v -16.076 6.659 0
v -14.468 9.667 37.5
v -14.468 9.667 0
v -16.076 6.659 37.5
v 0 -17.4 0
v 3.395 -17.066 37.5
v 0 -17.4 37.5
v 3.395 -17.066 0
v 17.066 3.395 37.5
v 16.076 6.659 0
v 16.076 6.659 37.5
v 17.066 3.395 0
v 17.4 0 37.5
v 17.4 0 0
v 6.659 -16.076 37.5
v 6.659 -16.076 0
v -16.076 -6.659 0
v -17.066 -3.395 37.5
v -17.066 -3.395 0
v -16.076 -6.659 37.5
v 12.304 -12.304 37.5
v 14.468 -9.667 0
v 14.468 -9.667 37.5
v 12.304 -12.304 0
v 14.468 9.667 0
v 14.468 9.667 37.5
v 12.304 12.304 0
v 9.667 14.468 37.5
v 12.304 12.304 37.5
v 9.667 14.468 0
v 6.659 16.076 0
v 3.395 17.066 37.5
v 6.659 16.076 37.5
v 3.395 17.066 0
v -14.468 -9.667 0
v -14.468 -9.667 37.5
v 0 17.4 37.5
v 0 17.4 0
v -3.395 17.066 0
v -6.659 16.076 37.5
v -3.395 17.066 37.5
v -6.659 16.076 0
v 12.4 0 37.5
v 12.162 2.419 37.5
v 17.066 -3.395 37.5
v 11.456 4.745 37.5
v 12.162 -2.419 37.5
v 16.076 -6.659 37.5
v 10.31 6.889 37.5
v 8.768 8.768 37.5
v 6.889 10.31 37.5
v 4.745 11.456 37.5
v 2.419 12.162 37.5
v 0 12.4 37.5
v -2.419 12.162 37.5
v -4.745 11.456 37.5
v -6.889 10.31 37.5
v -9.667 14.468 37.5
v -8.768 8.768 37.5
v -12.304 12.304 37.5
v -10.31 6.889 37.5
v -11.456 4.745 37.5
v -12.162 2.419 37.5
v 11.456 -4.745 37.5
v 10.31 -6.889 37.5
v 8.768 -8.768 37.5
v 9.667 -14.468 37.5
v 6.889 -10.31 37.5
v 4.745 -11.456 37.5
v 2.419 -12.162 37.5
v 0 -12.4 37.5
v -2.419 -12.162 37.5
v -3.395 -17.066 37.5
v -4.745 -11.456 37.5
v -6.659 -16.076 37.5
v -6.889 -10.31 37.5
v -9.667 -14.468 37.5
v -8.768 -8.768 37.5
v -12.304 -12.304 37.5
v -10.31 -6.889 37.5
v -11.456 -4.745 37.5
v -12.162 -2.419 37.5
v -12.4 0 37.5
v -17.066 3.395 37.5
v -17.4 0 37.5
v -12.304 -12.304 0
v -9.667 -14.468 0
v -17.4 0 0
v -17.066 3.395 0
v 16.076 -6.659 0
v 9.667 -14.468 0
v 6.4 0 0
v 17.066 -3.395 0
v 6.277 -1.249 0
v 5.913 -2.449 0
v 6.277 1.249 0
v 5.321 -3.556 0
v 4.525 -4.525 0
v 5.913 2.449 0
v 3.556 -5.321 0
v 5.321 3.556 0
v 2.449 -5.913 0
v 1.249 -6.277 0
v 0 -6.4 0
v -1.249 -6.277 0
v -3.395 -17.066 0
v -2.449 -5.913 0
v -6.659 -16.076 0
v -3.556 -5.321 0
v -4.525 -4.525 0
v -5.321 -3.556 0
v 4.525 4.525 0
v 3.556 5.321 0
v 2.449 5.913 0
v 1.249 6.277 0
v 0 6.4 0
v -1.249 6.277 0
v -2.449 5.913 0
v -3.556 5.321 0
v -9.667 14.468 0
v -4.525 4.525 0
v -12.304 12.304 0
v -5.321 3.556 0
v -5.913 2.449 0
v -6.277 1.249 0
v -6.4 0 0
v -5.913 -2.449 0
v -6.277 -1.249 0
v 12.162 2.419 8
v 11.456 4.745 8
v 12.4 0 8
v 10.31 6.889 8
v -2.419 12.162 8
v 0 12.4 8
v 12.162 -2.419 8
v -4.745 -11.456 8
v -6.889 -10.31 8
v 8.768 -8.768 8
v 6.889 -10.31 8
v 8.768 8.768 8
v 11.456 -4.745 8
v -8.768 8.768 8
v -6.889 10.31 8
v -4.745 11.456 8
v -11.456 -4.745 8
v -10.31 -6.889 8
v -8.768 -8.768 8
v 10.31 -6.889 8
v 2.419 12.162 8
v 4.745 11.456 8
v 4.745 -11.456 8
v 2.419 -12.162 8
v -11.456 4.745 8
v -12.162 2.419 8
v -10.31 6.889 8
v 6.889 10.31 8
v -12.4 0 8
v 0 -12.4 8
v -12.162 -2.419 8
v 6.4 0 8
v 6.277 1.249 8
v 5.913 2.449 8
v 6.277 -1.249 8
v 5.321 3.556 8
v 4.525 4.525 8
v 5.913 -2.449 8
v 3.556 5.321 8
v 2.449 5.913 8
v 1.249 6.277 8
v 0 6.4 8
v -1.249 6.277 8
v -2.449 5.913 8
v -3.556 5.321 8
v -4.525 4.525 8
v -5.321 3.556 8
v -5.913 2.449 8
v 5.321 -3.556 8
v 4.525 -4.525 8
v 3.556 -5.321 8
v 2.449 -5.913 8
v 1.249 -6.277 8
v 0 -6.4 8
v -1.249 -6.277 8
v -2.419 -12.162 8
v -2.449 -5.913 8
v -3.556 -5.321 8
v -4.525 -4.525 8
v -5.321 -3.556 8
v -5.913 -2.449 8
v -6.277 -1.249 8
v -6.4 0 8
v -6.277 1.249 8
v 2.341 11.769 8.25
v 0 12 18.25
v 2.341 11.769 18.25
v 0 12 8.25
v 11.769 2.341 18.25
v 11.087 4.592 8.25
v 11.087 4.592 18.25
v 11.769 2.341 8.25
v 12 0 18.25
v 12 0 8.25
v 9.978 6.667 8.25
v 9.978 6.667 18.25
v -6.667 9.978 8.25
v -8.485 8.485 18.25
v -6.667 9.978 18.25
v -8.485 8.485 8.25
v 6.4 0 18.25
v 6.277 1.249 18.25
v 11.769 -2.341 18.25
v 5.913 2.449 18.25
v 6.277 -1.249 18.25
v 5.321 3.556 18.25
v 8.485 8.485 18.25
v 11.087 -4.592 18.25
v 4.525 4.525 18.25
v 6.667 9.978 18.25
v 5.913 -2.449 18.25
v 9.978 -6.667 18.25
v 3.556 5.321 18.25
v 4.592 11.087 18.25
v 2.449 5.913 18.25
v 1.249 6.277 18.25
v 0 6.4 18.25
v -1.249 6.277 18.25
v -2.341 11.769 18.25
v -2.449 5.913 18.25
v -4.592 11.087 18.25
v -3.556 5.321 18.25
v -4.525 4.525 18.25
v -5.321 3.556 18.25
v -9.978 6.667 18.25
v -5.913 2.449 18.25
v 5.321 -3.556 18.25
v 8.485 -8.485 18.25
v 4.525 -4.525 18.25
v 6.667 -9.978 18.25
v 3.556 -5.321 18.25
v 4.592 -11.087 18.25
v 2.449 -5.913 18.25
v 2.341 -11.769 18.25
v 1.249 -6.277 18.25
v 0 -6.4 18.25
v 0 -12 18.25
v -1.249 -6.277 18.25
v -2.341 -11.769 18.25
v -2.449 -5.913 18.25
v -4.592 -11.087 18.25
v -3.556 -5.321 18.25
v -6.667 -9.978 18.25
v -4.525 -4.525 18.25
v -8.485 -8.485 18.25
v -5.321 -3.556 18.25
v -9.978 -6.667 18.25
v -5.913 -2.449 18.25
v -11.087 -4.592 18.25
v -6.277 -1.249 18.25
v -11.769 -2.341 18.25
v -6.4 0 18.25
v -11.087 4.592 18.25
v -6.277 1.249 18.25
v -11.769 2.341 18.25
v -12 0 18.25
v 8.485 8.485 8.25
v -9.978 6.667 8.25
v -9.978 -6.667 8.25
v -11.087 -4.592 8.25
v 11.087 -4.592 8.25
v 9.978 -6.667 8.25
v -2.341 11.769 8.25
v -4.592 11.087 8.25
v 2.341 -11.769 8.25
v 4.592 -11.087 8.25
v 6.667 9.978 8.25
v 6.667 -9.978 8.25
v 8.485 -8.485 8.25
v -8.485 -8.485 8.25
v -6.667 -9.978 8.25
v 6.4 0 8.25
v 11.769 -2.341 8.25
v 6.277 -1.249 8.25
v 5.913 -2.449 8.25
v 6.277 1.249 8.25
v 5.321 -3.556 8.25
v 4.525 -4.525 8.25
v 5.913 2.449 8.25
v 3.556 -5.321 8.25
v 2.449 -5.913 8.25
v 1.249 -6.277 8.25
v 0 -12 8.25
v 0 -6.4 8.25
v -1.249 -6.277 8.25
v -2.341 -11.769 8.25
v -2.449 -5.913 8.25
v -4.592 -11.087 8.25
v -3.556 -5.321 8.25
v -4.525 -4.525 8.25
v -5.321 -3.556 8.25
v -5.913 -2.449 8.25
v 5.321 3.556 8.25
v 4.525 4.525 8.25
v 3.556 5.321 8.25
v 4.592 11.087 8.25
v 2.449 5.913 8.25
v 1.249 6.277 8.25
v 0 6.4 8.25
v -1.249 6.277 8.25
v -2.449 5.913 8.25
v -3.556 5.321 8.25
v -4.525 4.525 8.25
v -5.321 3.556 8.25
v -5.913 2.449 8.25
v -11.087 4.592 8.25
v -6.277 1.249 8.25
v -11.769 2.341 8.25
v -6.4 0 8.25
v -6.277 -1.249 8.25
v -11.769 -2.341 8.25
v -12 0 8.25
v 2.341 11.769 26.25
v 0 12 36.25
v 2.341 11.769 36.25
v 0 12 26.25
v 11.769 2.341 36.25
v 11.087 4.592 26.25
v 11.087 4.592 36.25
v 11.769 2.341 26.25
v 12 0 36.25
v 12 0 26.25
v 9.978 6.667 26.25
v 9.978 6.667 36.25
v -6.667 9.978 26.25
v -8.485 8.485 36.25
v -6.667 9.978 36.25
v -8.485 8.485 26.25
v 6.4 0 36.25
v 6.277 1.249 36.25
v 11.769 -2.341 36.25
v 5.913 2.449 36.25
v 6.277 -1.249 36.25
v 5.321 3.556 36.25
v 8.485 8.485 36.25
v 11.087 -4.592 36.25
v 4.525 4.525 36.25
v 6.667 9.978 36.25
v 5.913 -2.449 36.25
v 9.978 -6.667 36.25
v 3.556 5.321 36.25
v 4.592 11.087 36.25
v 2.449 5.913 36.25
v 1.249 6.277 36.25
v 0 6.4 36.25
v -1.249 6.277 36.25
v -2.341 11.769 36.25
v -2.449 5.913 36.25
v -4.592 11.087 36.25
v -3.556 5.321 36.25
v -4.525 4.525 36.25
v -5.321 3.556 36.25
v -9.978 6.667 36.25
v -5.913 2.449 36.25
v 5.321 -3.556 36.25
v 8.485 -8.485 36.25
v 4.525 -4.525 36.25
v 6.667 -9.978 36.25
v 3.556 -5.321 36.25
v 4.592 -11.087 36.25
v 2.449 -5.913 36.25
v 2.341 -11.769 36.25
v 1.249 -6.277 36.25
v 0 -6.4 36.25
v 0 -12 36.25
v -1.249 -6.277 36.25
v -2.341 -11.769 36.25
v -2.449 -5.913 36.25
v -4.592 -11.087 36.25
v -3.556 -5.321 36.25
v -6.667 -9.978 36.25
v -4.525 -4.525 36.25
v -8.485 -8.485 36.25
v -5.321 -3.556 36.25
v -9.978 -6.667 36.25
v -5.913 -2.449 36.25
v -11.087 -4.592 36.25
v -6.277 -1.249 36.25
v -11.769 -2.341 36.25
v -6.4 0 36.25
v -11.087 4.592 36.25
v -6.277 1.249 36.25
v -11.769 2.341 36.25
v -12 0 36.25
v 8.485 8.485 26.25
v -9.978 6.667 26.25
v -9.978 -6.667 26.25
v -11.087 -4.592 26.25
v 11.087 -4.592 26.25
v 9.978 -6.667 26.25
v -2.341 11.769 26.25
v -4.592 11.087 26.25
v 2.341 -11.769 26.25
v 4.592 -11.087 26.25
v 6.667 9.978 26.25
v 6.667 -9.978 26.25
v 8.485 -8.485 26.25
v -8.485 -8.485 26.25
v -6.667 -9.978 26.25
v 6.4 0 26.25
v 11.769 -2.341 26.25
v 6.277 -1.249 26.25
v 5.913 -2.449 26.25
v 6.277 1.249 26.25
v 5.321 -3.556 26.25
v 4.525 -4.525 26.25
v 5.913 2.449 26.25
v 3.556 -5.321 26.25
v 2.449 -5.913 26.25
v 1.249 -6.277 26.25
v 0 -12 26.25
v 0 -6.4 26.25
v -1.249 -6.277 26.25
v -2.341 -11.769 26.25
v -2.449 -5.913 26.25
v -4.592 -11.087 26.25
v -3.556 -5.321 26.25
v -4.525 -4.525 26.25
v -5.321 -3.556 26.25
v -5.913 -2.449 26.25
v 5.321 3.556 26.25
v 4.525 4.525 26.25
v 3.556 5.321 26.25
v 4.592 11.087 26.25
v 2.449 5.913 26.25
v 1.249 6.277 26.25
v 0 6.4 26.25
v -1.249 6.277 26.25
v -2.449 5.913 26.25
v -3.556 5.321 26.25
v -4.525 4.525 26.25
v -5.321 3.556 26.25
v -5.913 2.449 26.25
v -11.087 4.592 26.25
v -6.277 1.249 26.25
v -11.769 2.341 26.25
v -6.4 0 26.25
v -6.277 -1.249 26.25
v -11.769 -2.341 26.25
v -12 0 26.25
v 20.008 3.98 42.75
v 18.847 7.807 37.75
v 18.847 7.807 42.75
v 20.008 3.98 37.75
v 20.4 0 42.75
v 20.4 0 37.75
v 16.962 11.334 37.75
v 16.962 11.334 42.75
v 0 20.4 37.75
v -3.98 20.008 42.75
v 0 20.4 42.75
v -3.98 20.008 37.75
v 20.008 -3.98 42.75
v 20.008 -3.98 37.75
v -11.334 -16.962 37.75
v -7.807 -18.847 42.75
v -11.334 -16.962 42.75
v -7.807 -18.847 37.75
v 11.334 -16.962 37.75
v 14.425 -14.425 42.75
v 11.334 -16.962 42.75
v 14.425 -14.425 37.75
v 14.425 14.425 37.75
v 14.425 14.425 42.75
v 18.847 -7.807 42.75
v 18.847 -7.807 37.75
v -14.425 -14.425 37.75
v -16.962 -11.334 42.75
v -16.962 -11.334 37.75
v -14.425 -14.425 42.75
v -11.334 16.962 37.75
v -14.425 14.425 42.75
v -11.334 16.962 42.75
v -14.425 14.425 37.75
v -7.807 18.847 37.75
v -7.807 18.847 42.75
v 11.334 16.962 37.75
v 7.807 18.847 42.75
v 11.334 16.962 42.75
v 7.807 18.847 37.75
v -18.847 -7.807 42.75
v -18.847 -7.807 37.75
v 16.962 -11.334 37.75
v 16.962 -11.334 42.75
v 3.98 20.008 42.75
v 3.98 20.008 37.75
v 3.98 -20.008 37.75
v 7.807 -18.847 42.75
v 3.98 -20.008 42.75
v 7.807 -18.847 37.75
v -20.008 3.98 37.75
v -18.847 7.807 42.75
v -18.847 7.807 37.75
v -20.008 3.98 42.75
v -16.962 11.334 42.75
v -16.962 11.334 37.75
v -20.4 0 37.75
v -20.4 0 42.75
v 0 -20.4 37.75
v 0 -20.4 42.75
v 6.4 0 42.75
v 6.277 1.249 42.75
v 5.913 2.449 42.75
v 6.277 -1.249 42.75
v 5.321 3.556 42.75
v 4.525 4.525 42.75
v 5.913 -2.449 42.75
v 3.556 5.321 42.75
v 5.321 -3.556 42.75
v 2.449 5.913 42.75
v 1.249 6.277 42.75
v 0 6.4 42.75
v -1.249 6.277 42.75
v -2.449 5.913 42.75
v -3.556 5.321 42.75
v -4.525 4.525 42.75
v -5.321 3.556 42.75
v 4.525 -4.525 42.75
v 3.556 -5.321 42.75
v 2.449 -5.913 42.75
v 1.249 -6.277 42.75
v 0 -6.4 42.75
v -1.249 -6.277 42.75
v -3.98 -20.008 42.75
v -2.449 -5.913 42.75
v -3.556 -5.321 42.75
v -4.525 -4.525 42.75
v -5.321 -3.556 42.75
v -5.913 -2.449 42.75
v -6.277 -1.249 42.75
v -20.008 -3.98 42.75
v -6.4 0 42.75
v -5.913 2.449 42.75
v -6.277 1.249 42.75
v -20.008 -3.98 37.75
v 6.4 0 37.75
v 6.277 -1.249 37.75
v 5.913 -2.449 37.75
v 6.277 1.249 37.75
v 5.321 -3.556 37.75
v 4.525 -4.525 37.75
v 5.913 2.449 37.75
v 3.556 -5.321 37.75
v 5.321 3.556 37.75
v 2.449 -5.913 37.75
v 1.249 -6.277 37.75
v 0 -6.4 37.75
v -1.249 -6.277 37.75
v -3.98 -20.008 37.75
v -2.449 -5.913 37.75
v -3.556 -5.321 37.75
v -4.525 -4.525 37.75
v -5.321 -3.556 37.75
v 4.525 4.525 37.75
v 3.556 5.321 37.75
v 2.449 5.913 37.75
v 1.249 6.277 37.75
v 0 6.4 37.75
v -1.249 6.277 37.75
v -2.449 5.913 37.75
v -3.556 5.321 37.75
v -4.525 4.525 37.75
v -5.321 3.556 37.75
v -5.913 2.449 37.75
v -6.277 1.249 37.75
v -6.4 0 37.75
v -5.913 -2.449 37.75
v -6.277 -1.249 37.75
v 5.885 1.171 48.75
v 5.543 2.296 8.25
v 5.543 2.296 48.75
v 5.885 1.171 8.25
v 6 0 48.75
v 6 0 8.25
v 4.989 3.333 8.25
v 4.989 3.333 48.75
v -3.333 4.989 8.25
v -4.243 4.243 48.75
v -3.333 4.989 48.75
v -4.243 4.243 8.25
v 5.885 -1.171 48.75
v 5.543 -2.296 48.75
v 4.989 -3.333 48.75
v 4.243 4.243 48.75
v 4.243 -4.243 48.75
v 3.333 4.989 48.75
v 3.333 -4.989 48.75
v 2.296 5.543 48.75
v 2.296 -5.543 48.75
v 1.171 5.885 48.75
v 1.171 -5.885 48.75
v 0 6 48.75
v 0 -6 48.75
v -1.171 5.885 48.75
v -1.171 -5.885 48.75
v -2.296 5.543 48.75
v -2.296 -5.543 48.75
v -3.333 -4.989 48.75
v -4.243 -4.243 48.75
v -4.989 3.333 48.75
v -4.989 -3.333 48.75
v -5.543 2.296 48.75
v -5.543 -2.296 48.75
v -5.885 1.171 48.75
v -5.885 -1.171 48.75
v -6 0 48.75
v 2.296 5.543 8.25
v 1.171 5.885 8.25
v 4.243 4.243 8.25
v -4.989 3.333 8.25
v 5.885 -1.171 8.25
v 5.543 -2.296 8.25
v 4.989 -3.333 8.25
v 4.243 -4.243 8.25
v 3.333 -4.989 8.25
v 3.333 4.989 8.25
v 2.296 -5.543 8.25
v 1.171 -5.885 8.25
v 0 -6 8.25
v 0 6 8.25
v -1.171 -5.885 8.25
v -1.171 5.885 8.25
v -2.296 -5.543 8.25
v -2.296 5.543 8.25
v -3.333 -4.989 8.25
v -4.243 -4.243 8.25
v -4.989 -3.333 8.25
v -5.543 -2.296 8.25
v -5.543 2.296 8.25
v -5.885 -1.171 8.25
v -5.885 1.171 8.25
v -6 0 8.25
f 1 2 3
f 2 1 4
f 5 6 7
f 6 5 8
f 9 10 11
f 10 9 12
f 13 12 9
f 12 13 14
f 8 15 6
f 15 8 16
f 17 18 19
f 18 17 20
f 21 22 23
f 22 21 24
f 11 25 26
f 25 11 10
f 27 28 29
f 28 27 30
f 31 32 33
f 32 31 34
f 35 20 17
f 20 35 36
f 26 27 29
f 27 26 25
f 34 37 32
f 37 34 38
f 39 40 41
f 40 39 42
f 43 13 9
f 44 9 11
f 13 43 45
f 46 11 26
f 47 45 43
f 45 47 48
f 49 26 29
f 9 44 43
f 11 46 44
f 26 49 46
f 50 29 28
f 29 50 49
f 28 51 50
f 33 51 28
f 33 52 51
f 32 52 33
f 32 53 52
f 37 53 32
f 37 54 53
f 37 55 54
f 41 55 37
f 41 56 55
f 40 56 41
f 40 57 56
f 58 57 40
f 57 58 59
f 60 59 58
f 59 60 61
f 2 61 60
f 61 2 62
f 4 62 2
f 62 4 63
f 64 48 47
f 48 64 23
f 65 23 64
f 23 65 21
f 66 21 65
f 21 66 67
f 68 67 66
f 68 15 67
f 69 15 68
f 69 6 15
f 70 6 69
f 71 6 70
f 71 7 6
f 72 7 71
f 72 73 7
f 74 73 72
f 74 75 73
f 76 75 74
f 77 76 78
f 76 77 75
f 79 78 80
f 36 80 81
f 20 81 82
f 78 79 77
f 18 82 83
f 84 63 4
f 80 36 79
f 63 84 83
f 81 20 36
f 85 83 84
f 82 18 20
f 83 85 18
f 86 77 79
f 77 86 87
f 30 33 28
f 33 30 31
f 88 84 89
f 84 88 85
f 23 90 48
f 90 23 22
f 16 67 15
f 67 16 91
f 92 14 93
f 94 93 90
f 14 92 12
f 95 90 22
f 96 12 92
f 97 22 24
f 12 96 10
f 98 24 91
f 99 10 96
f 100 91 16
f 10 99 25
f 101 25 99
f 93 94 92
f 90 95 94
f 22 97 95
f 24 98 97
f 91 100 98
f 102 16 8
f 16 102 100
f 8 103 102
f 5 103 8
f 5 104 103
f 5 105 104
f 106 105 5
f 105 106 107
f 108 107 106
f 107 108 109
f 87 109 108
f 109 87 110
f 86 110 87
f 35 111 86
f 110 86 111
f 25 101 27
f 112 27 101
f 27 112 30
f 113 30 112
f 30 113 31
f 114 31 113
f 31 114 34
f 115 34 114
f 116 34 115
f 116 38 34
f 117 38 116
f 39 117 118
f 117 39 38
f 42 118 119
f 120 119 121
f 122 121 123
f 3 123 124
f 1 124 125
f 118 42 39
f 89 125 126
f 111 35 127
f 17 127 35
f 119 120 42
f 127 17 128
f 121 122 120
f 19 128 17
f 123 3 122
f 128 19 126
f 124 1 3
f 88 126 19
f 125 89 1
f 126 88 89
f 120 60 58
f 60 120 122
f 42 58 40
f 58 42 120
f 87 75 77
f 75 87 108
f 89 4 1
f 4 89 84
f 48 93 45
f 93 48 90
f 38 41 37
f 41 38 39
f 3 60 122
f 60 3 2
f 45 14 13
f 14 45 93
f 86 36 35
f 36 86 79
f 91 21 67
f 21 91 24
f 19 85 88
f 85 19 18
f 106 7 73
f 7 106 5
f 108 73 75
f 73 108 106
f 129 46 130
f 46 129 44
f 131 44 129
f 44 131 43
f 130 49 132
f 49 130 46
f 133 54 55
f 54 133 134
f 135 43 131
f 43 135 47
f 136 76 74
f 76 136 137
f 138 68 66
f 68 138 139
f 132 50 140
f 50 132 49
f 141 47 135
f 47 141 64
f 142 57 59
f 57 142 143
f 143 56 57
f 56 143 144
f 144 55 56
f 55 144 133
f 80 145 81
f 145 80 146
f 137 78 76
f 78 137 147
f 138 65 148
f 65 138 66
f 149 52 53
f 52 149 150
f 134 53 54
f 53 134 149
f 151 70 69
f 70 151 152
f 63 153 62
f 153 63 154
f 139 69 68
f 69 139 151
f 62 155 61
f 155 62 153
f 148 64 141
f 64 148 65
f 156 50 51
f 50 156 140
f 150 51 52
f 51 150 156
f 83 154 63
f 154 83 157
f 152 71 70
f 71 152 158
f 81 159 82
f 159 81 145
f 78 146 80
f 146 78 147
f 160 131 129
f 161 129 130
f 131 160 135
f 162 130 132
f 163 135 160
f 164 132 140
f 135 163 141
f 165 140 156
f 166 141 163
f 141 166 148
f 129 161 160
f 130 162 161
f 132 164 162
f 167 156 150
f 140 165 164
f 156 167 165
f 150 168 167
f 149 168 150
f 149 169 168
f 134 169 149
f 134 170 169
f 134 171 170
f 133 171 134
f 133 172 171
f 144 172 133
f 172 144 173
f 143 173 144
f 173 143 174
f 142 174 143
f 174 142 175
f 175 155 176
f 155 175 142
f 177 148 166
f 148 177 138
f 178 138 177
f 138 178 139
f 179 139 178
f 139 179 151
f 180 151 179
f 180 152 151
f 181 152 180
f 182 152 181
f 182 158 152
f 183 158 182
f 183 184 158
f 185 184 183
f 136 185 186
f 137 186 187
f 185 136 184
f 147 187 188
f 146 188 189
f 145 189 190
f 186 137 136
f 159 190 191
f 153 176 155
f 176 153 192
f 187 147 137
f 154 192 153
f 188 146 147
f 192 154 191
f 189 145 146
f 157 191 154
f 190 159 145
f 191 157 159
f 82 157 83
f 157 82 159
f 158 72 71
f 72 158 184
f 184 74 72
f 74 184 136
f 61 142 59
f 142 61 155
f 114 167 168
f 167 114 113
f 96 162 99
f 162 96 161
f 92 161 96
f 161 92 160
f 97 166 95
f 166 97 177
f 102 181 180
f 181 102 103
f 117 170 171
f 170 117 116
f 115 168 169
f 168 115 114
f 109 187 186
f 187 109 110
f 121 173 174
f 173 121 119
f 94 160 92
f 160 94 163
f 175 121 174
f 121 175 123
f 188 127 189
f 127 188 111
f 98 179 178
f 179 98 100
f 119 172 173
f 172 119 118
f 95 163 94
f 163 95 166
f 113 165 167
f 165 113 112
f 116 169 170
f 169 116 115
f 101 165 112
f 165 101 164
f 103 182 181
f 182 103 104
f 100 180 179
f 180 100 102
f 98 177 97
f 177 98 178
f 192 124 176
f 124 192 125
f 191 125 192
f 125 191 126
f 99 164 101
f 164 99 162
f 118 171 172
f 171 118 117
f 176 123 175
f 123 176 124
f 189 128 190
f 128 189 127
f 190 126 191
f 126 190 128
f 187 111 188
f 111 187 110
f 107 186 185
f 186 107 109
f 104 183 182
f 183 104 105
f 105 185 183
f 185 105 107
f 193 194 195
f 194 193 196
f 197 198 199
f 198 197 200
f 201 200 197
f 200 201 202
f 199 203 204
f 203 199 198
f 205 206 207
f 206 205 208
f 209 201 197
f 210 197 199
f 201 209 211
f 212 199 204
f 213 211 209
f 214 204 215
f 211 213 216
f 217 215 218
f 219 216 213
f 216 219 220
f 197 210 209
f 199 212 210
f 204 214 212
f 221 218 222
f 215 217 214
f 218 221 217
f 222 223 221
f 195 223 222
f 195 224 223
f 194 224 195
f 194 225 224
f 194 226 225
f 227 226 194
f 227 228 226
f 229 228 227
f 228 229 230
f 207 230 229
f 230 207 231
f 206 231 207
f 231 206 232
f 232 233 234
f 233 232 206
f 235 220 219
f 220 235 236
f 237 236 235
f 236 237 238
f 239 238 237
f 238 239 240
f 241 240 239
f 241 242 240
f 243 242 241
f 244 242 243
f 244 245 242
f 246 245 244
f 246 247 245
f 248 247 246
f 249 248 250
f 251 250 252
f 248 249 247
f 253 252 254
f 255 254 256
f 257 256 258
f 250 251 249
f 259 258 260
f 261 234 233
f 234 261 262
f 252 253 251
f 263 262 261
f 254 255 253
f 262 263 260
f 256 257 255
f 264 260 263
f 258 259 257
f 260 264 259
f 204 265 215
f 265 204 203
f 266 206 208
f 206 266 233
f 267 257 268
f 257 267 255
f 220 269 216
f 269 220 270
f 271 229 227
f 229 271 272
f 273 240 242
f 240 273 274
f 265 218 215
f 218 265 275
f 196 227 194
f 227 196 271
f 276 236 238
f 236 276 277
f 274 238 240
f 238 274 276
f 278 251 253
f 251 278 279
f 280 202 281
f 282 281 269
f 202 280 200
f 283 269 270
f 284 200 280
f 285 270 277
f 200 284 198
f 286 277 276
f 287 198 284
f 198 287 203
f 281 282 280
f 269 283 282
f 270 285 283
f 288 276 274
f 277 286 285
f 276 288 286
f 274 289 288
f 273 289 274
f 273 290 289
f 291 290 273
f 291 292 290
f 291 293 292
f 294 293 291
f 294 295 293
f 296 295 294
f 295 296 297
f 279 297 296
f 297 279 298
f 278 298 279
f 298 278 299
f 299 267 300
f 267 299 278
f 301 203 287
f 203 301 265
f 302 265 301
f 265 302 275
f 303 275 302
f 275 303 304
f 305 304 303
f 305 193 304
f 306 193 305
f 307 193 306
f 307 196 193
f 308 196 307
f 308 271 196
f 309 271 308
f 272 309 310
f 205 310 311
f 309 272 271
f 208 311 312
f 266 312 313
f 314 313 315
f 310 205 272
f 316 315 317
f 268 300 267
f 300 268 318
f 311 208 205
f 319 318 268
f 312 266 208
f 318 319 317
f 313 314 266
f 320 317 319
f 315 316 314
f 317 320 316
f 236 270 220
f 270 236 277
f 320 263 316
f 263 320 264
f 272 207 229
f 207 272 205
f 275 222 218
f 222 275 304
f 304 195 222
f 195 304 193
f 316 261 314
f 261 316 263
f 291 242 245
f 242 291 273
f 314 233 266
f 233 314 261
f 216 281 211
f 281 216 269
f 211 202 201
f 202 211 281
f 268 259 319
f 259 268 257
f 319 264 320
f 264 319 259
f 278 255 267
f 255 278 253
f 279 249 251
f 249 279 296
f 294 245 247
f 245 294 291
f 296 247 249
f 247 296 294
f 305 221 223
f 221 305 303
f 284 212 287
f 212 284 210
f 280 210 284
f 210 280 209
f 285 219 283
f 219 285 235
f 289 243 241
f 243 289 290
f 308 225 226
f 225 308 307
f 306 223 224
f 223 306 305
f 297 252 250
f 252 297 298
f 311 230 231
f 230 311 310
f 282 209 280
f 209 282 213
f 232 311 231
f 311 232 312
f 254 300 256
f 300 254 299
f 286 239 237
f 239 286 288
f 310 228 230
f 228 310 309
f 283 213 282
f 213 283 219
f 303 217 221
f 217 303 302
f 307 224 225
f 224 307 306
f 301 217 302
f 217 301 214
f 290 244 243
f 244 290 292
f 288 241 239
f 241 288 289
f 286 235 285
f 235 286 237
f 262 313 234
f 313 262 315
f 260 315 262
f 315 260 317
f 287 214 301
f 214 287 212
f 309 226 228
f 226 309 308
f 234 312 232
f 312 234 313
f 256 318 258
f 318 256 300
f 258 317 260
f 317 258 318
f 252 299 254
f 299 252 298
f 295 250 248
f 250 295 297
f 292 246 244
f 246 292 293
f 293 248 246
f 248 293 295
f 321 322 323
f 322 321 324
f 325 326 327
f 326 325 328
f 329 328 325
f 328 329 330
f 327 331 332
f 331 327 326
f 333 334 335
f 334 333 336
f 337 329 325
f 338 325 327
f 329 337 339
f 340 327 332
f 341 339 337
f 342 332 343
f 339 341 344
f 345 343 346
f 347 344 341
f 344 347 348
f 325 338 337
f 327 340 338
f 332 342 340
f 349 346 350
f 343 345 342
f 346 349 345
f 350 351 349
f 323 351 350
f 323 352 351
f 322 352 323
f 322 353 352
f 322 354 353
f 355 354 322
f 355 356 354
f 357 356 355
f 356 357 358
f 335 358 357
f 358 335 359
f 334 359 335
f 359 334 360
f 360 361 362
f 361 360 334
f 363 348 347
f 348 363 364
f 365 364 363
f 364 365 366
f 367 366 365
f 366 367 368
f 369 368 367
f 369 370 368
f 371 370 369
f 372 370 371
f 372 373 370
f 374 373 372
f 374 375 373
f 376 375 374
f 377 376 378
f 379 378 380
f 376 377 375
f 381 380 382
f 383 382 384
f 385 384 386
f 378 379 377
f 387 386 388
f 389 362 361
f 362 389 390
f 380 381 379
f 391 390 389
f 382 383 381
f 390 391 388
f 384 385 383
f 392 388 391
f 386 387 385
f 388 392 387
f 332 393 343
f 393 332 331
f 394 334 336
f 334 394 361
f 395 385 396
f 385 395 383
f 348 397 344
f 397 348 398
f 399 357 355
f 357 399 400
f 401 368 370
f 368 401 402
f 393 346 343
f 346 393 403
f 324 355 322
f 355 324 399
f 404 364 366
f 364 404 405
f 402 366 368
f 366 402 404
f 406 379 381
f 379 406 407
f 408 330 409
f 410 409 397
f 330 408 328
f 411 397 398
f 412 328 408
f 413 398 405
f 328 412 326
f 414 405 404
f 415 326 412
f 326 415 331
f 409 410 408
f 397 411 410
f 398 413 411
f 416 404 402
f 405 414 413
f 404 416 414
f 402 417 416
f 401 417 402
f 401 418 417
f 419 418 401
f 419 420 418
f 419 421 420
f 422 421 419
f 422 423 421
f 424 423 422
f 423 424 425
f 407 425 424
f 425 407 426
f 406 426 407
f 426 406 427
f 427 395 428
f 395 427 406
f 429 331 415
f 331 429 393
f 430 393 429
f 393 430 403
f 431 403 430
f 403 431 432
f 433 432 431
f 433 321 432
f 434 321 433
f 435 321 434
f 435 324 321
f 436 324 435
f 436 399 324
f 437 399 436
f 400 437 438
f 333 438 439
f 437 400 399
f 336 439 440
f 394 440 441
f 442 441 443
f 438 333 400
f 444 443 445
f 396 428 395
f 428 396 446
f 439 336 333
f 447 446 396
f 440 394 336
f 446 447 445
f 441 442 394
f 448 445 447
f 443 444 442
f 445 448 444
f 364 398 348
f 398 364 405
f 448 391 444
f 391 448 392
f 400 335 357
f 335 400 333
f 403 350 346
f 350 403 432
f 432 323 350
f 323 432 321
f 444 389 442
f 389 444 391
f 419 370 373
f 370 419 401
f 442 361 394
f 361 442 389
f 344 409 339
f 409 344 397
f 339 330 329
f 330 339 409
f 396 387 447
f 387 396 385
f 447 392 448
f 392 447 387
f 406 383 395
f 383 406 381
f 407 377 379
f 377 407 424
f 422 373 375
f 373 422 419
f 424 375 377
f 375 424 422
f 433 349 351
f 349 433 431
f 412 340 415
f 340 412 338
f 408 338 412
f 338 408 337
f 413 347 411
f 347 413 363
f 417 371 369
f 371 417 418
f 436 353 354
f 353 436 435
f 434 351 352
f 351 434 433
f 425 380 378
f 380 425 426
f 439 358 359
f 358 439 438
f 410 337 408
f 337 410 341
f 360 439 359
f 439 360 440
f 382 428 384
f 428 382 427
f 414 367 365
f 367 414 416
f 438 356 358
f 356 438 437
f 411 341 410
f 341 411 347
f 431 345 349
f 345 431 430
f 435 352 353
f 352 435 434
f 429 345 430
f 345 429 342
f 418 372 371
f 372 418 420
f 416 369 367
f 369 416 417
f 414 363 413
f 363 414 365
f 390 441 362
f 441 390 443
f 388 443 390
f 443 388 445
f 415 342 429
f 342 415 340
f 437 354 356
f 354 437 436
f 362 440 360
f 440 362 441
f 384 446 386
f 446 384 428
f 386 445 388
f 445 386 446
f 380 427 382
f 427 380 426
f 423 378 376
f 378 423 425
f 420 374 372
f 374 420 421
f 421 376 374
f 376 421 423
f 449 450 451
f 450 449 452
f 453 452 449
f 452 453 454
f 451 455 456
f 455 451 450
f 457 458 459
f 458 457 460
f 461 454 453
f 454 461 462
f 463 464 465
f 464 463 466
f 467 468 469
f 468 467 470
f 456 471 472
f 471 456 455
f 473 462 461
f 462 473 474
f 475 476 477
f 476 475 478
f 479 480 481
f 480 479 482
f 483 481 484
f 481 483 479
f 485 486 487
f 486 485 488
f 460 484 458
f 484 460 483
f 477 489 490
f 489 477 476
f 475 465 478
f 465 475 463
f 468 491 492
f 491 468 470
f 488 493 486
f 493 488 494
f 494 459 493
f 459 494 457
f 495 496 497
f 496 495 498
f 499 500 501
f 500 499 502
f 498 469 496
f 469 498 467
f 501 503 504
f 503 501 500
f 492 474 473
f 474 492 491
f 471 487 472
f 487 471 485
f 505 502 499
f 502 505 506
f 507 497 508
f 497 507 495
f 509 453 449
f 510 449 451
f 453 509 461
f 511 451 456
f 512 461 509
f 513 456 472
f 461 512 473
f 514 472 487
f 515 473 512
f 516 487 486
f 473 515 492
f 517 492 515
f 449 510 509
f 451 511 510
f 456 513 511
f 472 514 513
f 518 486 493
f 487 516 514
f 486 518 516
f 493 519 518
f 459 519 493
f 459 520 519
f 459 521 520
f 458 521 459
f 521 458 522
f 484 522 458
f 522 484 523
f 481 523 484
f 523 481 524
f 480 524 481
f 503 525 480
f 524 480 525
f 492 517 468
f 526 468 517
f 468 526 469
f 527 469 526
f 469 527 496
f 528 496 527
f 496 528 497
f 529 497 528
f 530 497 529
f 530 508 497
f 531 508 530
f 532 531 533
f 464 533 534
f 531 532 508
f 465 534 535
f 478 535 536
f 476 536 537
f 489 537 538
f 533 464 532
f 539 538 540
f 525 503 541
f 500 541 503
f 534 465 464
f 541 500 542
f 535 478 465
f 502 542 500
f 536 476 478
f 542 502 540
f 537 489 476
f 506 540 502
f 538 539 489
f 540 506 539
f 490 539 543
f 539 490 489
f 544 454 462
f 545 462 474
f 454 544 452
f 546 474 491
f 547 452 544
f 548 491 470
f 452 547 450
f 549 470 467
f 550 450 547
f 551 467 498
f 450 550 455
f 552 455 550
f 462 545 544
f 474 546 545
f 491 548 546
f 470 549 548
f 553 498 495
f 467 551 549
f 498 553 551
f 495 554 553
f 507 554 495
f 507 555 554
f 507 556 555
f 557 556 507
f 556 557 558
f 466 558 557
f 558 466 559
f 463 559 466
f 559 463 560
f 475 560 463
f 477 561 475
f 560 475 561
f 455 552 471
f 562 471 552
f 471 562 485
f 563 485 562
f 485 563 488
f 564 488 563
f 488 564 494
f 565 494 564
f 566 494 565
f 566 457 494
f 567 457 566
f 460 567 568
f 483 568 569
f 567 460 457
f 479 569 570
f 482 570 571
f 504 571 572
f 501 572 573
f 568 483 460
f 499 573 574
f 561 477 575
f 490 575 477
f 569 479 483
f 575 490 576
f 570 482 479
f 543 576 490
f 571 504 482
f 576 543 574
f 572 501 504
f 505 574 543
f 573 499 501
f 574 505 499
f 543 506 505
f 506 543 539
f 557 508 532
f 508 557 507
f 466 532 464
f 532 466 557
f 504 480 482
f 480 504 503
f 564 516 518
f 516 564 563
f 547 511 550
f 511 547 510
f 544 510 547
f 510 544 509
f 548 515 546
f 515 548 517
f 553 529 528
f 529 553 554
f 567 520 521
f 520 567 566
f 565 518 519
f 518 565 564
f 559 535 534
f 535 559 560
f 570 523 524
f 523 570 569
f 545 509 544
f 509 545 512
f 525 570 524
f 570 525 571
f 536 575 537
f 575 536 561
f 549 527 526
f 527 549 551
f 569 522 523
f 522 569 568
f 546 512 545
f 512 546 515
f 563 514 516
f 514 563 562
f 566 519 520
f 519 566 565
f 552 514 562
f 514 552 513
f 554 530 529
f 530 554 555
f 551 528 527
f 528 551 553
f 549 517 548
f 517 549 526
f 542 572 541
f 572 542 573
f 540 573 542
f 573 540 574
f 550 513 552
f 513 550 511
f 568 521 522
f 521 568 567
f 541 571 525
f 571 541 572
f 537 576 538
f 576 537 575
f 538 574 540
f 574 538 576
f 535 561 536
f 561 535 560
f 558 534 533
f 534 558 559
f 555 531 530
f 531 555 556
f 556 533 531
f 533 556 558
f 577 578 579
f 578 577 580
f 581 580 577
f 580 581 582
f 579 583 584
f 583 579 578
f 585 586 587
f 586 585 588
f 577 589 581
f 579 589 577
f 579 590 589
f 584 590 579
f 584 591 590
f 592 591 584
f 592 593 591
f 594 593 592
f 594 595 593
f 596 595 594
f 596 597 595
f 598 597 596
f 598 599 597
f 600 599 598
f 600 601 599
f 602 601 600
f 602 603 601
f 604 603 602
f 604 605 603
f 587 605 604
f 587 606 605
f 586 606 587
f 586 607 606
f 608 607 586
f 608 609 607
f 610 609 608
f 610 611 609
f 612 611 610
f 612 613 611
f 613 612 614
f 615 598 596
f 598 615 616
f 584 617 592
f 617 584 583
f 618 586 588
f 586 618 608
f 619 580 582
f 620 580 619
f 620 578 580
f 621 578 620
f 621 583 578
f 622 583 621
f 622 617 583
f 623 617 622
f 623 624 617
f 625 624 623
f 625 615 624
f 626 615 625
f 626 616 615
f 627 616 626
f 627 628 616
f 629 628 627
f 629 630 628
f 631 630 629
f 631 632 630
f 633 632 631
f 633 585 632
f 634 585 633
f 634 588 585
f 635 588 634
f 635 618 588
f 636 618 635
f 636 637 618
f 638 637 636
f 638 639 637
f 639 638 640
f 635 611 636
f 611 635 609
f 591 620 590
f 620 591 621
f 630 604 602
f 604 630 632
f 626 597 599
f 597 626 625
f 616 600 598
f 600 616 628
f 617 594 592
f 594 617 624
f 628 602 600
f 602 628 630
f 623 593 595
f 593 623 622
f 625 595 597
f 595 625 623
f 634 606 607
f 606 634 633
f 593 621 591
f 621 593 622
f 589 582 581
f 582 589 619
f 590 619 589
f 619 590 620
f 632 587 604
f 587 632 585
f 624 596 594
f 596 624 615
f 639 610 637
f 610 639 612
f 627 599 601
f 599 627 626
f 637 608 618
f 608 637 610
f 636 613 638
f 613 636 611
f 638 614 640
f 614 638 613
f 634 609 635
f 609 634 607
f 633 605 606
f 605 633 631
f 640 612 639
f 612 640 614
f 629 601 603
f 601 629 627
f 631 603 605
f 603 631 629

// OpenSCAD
$fn = 32;

// ------------------------------------------------------------------------
// Shaft station: cup d34.8 x 37.5 mm, shaft d12
// Every part is its own module, assembly() places every instance.
// ------------------------------------------------------------------------

// --- part 1 ---
module housing_cup() {
  difference() {
    cylinder(h = 37.5, d = 34.8);
    translate([0, 0, 8]) cylinder(h = 30.5, d = 24.8);
    translate([0, 0, -1]) cylinder(h = 10, d = 12.8);
  }
}

// --- part 2 ---
module bearing_lower() {
  difference() {
      translate([0, 0, 0]) cylinder(h = 10, d = 24);
      translate([0, 0, -1]) cylinder(h = 12, d = 12.8);
    }
}

// --- part 3 ---
module bearing_upper() {
  difference() {
      translate([0, 0, 0]) cylinder(h = 10, d = 24);
      translate([0, 0, -1]) cylinder(h = 12, d = 12.8);
    }
}

// --- part 4 ---
module station_shaft() {
  translate([0, 0, -20.25]) cylinder(h = 40.5, d = 12);
}

// --- part 5 ---
module station_cover() {
  difference() {
    cylinder(h = 5, d = 40.8);
    translate([0, 0, -1]) cylinder(h = 7, d = 12.8);
  }
}

// --- assembly ---
module assembly() {
  color([0.80, 0.24, 0.20]) translate([0, 0, 0]) rotate([0, 0, 0]) housing_cup();
  color([0.20, 0.45, 0.75]) translate([0, 0, 8.25]) rotate([0, 0, 0]) bearing_lower();
  color([0.25, 0.62, 0.32]) translate([0, 0, 26.25]) rotate([0, 0, 0]) bearing_upper();
  color([0.92, 0.70, 0.18]) translate([0, 0, 28.5]) rotate([0, 0, 0]) station_shaft();
  color([0.58, 0.35, 0.70]) translate([0, 0, 37.75]) rotate([0, 0, 0]) station_cover();
}

assembly();
